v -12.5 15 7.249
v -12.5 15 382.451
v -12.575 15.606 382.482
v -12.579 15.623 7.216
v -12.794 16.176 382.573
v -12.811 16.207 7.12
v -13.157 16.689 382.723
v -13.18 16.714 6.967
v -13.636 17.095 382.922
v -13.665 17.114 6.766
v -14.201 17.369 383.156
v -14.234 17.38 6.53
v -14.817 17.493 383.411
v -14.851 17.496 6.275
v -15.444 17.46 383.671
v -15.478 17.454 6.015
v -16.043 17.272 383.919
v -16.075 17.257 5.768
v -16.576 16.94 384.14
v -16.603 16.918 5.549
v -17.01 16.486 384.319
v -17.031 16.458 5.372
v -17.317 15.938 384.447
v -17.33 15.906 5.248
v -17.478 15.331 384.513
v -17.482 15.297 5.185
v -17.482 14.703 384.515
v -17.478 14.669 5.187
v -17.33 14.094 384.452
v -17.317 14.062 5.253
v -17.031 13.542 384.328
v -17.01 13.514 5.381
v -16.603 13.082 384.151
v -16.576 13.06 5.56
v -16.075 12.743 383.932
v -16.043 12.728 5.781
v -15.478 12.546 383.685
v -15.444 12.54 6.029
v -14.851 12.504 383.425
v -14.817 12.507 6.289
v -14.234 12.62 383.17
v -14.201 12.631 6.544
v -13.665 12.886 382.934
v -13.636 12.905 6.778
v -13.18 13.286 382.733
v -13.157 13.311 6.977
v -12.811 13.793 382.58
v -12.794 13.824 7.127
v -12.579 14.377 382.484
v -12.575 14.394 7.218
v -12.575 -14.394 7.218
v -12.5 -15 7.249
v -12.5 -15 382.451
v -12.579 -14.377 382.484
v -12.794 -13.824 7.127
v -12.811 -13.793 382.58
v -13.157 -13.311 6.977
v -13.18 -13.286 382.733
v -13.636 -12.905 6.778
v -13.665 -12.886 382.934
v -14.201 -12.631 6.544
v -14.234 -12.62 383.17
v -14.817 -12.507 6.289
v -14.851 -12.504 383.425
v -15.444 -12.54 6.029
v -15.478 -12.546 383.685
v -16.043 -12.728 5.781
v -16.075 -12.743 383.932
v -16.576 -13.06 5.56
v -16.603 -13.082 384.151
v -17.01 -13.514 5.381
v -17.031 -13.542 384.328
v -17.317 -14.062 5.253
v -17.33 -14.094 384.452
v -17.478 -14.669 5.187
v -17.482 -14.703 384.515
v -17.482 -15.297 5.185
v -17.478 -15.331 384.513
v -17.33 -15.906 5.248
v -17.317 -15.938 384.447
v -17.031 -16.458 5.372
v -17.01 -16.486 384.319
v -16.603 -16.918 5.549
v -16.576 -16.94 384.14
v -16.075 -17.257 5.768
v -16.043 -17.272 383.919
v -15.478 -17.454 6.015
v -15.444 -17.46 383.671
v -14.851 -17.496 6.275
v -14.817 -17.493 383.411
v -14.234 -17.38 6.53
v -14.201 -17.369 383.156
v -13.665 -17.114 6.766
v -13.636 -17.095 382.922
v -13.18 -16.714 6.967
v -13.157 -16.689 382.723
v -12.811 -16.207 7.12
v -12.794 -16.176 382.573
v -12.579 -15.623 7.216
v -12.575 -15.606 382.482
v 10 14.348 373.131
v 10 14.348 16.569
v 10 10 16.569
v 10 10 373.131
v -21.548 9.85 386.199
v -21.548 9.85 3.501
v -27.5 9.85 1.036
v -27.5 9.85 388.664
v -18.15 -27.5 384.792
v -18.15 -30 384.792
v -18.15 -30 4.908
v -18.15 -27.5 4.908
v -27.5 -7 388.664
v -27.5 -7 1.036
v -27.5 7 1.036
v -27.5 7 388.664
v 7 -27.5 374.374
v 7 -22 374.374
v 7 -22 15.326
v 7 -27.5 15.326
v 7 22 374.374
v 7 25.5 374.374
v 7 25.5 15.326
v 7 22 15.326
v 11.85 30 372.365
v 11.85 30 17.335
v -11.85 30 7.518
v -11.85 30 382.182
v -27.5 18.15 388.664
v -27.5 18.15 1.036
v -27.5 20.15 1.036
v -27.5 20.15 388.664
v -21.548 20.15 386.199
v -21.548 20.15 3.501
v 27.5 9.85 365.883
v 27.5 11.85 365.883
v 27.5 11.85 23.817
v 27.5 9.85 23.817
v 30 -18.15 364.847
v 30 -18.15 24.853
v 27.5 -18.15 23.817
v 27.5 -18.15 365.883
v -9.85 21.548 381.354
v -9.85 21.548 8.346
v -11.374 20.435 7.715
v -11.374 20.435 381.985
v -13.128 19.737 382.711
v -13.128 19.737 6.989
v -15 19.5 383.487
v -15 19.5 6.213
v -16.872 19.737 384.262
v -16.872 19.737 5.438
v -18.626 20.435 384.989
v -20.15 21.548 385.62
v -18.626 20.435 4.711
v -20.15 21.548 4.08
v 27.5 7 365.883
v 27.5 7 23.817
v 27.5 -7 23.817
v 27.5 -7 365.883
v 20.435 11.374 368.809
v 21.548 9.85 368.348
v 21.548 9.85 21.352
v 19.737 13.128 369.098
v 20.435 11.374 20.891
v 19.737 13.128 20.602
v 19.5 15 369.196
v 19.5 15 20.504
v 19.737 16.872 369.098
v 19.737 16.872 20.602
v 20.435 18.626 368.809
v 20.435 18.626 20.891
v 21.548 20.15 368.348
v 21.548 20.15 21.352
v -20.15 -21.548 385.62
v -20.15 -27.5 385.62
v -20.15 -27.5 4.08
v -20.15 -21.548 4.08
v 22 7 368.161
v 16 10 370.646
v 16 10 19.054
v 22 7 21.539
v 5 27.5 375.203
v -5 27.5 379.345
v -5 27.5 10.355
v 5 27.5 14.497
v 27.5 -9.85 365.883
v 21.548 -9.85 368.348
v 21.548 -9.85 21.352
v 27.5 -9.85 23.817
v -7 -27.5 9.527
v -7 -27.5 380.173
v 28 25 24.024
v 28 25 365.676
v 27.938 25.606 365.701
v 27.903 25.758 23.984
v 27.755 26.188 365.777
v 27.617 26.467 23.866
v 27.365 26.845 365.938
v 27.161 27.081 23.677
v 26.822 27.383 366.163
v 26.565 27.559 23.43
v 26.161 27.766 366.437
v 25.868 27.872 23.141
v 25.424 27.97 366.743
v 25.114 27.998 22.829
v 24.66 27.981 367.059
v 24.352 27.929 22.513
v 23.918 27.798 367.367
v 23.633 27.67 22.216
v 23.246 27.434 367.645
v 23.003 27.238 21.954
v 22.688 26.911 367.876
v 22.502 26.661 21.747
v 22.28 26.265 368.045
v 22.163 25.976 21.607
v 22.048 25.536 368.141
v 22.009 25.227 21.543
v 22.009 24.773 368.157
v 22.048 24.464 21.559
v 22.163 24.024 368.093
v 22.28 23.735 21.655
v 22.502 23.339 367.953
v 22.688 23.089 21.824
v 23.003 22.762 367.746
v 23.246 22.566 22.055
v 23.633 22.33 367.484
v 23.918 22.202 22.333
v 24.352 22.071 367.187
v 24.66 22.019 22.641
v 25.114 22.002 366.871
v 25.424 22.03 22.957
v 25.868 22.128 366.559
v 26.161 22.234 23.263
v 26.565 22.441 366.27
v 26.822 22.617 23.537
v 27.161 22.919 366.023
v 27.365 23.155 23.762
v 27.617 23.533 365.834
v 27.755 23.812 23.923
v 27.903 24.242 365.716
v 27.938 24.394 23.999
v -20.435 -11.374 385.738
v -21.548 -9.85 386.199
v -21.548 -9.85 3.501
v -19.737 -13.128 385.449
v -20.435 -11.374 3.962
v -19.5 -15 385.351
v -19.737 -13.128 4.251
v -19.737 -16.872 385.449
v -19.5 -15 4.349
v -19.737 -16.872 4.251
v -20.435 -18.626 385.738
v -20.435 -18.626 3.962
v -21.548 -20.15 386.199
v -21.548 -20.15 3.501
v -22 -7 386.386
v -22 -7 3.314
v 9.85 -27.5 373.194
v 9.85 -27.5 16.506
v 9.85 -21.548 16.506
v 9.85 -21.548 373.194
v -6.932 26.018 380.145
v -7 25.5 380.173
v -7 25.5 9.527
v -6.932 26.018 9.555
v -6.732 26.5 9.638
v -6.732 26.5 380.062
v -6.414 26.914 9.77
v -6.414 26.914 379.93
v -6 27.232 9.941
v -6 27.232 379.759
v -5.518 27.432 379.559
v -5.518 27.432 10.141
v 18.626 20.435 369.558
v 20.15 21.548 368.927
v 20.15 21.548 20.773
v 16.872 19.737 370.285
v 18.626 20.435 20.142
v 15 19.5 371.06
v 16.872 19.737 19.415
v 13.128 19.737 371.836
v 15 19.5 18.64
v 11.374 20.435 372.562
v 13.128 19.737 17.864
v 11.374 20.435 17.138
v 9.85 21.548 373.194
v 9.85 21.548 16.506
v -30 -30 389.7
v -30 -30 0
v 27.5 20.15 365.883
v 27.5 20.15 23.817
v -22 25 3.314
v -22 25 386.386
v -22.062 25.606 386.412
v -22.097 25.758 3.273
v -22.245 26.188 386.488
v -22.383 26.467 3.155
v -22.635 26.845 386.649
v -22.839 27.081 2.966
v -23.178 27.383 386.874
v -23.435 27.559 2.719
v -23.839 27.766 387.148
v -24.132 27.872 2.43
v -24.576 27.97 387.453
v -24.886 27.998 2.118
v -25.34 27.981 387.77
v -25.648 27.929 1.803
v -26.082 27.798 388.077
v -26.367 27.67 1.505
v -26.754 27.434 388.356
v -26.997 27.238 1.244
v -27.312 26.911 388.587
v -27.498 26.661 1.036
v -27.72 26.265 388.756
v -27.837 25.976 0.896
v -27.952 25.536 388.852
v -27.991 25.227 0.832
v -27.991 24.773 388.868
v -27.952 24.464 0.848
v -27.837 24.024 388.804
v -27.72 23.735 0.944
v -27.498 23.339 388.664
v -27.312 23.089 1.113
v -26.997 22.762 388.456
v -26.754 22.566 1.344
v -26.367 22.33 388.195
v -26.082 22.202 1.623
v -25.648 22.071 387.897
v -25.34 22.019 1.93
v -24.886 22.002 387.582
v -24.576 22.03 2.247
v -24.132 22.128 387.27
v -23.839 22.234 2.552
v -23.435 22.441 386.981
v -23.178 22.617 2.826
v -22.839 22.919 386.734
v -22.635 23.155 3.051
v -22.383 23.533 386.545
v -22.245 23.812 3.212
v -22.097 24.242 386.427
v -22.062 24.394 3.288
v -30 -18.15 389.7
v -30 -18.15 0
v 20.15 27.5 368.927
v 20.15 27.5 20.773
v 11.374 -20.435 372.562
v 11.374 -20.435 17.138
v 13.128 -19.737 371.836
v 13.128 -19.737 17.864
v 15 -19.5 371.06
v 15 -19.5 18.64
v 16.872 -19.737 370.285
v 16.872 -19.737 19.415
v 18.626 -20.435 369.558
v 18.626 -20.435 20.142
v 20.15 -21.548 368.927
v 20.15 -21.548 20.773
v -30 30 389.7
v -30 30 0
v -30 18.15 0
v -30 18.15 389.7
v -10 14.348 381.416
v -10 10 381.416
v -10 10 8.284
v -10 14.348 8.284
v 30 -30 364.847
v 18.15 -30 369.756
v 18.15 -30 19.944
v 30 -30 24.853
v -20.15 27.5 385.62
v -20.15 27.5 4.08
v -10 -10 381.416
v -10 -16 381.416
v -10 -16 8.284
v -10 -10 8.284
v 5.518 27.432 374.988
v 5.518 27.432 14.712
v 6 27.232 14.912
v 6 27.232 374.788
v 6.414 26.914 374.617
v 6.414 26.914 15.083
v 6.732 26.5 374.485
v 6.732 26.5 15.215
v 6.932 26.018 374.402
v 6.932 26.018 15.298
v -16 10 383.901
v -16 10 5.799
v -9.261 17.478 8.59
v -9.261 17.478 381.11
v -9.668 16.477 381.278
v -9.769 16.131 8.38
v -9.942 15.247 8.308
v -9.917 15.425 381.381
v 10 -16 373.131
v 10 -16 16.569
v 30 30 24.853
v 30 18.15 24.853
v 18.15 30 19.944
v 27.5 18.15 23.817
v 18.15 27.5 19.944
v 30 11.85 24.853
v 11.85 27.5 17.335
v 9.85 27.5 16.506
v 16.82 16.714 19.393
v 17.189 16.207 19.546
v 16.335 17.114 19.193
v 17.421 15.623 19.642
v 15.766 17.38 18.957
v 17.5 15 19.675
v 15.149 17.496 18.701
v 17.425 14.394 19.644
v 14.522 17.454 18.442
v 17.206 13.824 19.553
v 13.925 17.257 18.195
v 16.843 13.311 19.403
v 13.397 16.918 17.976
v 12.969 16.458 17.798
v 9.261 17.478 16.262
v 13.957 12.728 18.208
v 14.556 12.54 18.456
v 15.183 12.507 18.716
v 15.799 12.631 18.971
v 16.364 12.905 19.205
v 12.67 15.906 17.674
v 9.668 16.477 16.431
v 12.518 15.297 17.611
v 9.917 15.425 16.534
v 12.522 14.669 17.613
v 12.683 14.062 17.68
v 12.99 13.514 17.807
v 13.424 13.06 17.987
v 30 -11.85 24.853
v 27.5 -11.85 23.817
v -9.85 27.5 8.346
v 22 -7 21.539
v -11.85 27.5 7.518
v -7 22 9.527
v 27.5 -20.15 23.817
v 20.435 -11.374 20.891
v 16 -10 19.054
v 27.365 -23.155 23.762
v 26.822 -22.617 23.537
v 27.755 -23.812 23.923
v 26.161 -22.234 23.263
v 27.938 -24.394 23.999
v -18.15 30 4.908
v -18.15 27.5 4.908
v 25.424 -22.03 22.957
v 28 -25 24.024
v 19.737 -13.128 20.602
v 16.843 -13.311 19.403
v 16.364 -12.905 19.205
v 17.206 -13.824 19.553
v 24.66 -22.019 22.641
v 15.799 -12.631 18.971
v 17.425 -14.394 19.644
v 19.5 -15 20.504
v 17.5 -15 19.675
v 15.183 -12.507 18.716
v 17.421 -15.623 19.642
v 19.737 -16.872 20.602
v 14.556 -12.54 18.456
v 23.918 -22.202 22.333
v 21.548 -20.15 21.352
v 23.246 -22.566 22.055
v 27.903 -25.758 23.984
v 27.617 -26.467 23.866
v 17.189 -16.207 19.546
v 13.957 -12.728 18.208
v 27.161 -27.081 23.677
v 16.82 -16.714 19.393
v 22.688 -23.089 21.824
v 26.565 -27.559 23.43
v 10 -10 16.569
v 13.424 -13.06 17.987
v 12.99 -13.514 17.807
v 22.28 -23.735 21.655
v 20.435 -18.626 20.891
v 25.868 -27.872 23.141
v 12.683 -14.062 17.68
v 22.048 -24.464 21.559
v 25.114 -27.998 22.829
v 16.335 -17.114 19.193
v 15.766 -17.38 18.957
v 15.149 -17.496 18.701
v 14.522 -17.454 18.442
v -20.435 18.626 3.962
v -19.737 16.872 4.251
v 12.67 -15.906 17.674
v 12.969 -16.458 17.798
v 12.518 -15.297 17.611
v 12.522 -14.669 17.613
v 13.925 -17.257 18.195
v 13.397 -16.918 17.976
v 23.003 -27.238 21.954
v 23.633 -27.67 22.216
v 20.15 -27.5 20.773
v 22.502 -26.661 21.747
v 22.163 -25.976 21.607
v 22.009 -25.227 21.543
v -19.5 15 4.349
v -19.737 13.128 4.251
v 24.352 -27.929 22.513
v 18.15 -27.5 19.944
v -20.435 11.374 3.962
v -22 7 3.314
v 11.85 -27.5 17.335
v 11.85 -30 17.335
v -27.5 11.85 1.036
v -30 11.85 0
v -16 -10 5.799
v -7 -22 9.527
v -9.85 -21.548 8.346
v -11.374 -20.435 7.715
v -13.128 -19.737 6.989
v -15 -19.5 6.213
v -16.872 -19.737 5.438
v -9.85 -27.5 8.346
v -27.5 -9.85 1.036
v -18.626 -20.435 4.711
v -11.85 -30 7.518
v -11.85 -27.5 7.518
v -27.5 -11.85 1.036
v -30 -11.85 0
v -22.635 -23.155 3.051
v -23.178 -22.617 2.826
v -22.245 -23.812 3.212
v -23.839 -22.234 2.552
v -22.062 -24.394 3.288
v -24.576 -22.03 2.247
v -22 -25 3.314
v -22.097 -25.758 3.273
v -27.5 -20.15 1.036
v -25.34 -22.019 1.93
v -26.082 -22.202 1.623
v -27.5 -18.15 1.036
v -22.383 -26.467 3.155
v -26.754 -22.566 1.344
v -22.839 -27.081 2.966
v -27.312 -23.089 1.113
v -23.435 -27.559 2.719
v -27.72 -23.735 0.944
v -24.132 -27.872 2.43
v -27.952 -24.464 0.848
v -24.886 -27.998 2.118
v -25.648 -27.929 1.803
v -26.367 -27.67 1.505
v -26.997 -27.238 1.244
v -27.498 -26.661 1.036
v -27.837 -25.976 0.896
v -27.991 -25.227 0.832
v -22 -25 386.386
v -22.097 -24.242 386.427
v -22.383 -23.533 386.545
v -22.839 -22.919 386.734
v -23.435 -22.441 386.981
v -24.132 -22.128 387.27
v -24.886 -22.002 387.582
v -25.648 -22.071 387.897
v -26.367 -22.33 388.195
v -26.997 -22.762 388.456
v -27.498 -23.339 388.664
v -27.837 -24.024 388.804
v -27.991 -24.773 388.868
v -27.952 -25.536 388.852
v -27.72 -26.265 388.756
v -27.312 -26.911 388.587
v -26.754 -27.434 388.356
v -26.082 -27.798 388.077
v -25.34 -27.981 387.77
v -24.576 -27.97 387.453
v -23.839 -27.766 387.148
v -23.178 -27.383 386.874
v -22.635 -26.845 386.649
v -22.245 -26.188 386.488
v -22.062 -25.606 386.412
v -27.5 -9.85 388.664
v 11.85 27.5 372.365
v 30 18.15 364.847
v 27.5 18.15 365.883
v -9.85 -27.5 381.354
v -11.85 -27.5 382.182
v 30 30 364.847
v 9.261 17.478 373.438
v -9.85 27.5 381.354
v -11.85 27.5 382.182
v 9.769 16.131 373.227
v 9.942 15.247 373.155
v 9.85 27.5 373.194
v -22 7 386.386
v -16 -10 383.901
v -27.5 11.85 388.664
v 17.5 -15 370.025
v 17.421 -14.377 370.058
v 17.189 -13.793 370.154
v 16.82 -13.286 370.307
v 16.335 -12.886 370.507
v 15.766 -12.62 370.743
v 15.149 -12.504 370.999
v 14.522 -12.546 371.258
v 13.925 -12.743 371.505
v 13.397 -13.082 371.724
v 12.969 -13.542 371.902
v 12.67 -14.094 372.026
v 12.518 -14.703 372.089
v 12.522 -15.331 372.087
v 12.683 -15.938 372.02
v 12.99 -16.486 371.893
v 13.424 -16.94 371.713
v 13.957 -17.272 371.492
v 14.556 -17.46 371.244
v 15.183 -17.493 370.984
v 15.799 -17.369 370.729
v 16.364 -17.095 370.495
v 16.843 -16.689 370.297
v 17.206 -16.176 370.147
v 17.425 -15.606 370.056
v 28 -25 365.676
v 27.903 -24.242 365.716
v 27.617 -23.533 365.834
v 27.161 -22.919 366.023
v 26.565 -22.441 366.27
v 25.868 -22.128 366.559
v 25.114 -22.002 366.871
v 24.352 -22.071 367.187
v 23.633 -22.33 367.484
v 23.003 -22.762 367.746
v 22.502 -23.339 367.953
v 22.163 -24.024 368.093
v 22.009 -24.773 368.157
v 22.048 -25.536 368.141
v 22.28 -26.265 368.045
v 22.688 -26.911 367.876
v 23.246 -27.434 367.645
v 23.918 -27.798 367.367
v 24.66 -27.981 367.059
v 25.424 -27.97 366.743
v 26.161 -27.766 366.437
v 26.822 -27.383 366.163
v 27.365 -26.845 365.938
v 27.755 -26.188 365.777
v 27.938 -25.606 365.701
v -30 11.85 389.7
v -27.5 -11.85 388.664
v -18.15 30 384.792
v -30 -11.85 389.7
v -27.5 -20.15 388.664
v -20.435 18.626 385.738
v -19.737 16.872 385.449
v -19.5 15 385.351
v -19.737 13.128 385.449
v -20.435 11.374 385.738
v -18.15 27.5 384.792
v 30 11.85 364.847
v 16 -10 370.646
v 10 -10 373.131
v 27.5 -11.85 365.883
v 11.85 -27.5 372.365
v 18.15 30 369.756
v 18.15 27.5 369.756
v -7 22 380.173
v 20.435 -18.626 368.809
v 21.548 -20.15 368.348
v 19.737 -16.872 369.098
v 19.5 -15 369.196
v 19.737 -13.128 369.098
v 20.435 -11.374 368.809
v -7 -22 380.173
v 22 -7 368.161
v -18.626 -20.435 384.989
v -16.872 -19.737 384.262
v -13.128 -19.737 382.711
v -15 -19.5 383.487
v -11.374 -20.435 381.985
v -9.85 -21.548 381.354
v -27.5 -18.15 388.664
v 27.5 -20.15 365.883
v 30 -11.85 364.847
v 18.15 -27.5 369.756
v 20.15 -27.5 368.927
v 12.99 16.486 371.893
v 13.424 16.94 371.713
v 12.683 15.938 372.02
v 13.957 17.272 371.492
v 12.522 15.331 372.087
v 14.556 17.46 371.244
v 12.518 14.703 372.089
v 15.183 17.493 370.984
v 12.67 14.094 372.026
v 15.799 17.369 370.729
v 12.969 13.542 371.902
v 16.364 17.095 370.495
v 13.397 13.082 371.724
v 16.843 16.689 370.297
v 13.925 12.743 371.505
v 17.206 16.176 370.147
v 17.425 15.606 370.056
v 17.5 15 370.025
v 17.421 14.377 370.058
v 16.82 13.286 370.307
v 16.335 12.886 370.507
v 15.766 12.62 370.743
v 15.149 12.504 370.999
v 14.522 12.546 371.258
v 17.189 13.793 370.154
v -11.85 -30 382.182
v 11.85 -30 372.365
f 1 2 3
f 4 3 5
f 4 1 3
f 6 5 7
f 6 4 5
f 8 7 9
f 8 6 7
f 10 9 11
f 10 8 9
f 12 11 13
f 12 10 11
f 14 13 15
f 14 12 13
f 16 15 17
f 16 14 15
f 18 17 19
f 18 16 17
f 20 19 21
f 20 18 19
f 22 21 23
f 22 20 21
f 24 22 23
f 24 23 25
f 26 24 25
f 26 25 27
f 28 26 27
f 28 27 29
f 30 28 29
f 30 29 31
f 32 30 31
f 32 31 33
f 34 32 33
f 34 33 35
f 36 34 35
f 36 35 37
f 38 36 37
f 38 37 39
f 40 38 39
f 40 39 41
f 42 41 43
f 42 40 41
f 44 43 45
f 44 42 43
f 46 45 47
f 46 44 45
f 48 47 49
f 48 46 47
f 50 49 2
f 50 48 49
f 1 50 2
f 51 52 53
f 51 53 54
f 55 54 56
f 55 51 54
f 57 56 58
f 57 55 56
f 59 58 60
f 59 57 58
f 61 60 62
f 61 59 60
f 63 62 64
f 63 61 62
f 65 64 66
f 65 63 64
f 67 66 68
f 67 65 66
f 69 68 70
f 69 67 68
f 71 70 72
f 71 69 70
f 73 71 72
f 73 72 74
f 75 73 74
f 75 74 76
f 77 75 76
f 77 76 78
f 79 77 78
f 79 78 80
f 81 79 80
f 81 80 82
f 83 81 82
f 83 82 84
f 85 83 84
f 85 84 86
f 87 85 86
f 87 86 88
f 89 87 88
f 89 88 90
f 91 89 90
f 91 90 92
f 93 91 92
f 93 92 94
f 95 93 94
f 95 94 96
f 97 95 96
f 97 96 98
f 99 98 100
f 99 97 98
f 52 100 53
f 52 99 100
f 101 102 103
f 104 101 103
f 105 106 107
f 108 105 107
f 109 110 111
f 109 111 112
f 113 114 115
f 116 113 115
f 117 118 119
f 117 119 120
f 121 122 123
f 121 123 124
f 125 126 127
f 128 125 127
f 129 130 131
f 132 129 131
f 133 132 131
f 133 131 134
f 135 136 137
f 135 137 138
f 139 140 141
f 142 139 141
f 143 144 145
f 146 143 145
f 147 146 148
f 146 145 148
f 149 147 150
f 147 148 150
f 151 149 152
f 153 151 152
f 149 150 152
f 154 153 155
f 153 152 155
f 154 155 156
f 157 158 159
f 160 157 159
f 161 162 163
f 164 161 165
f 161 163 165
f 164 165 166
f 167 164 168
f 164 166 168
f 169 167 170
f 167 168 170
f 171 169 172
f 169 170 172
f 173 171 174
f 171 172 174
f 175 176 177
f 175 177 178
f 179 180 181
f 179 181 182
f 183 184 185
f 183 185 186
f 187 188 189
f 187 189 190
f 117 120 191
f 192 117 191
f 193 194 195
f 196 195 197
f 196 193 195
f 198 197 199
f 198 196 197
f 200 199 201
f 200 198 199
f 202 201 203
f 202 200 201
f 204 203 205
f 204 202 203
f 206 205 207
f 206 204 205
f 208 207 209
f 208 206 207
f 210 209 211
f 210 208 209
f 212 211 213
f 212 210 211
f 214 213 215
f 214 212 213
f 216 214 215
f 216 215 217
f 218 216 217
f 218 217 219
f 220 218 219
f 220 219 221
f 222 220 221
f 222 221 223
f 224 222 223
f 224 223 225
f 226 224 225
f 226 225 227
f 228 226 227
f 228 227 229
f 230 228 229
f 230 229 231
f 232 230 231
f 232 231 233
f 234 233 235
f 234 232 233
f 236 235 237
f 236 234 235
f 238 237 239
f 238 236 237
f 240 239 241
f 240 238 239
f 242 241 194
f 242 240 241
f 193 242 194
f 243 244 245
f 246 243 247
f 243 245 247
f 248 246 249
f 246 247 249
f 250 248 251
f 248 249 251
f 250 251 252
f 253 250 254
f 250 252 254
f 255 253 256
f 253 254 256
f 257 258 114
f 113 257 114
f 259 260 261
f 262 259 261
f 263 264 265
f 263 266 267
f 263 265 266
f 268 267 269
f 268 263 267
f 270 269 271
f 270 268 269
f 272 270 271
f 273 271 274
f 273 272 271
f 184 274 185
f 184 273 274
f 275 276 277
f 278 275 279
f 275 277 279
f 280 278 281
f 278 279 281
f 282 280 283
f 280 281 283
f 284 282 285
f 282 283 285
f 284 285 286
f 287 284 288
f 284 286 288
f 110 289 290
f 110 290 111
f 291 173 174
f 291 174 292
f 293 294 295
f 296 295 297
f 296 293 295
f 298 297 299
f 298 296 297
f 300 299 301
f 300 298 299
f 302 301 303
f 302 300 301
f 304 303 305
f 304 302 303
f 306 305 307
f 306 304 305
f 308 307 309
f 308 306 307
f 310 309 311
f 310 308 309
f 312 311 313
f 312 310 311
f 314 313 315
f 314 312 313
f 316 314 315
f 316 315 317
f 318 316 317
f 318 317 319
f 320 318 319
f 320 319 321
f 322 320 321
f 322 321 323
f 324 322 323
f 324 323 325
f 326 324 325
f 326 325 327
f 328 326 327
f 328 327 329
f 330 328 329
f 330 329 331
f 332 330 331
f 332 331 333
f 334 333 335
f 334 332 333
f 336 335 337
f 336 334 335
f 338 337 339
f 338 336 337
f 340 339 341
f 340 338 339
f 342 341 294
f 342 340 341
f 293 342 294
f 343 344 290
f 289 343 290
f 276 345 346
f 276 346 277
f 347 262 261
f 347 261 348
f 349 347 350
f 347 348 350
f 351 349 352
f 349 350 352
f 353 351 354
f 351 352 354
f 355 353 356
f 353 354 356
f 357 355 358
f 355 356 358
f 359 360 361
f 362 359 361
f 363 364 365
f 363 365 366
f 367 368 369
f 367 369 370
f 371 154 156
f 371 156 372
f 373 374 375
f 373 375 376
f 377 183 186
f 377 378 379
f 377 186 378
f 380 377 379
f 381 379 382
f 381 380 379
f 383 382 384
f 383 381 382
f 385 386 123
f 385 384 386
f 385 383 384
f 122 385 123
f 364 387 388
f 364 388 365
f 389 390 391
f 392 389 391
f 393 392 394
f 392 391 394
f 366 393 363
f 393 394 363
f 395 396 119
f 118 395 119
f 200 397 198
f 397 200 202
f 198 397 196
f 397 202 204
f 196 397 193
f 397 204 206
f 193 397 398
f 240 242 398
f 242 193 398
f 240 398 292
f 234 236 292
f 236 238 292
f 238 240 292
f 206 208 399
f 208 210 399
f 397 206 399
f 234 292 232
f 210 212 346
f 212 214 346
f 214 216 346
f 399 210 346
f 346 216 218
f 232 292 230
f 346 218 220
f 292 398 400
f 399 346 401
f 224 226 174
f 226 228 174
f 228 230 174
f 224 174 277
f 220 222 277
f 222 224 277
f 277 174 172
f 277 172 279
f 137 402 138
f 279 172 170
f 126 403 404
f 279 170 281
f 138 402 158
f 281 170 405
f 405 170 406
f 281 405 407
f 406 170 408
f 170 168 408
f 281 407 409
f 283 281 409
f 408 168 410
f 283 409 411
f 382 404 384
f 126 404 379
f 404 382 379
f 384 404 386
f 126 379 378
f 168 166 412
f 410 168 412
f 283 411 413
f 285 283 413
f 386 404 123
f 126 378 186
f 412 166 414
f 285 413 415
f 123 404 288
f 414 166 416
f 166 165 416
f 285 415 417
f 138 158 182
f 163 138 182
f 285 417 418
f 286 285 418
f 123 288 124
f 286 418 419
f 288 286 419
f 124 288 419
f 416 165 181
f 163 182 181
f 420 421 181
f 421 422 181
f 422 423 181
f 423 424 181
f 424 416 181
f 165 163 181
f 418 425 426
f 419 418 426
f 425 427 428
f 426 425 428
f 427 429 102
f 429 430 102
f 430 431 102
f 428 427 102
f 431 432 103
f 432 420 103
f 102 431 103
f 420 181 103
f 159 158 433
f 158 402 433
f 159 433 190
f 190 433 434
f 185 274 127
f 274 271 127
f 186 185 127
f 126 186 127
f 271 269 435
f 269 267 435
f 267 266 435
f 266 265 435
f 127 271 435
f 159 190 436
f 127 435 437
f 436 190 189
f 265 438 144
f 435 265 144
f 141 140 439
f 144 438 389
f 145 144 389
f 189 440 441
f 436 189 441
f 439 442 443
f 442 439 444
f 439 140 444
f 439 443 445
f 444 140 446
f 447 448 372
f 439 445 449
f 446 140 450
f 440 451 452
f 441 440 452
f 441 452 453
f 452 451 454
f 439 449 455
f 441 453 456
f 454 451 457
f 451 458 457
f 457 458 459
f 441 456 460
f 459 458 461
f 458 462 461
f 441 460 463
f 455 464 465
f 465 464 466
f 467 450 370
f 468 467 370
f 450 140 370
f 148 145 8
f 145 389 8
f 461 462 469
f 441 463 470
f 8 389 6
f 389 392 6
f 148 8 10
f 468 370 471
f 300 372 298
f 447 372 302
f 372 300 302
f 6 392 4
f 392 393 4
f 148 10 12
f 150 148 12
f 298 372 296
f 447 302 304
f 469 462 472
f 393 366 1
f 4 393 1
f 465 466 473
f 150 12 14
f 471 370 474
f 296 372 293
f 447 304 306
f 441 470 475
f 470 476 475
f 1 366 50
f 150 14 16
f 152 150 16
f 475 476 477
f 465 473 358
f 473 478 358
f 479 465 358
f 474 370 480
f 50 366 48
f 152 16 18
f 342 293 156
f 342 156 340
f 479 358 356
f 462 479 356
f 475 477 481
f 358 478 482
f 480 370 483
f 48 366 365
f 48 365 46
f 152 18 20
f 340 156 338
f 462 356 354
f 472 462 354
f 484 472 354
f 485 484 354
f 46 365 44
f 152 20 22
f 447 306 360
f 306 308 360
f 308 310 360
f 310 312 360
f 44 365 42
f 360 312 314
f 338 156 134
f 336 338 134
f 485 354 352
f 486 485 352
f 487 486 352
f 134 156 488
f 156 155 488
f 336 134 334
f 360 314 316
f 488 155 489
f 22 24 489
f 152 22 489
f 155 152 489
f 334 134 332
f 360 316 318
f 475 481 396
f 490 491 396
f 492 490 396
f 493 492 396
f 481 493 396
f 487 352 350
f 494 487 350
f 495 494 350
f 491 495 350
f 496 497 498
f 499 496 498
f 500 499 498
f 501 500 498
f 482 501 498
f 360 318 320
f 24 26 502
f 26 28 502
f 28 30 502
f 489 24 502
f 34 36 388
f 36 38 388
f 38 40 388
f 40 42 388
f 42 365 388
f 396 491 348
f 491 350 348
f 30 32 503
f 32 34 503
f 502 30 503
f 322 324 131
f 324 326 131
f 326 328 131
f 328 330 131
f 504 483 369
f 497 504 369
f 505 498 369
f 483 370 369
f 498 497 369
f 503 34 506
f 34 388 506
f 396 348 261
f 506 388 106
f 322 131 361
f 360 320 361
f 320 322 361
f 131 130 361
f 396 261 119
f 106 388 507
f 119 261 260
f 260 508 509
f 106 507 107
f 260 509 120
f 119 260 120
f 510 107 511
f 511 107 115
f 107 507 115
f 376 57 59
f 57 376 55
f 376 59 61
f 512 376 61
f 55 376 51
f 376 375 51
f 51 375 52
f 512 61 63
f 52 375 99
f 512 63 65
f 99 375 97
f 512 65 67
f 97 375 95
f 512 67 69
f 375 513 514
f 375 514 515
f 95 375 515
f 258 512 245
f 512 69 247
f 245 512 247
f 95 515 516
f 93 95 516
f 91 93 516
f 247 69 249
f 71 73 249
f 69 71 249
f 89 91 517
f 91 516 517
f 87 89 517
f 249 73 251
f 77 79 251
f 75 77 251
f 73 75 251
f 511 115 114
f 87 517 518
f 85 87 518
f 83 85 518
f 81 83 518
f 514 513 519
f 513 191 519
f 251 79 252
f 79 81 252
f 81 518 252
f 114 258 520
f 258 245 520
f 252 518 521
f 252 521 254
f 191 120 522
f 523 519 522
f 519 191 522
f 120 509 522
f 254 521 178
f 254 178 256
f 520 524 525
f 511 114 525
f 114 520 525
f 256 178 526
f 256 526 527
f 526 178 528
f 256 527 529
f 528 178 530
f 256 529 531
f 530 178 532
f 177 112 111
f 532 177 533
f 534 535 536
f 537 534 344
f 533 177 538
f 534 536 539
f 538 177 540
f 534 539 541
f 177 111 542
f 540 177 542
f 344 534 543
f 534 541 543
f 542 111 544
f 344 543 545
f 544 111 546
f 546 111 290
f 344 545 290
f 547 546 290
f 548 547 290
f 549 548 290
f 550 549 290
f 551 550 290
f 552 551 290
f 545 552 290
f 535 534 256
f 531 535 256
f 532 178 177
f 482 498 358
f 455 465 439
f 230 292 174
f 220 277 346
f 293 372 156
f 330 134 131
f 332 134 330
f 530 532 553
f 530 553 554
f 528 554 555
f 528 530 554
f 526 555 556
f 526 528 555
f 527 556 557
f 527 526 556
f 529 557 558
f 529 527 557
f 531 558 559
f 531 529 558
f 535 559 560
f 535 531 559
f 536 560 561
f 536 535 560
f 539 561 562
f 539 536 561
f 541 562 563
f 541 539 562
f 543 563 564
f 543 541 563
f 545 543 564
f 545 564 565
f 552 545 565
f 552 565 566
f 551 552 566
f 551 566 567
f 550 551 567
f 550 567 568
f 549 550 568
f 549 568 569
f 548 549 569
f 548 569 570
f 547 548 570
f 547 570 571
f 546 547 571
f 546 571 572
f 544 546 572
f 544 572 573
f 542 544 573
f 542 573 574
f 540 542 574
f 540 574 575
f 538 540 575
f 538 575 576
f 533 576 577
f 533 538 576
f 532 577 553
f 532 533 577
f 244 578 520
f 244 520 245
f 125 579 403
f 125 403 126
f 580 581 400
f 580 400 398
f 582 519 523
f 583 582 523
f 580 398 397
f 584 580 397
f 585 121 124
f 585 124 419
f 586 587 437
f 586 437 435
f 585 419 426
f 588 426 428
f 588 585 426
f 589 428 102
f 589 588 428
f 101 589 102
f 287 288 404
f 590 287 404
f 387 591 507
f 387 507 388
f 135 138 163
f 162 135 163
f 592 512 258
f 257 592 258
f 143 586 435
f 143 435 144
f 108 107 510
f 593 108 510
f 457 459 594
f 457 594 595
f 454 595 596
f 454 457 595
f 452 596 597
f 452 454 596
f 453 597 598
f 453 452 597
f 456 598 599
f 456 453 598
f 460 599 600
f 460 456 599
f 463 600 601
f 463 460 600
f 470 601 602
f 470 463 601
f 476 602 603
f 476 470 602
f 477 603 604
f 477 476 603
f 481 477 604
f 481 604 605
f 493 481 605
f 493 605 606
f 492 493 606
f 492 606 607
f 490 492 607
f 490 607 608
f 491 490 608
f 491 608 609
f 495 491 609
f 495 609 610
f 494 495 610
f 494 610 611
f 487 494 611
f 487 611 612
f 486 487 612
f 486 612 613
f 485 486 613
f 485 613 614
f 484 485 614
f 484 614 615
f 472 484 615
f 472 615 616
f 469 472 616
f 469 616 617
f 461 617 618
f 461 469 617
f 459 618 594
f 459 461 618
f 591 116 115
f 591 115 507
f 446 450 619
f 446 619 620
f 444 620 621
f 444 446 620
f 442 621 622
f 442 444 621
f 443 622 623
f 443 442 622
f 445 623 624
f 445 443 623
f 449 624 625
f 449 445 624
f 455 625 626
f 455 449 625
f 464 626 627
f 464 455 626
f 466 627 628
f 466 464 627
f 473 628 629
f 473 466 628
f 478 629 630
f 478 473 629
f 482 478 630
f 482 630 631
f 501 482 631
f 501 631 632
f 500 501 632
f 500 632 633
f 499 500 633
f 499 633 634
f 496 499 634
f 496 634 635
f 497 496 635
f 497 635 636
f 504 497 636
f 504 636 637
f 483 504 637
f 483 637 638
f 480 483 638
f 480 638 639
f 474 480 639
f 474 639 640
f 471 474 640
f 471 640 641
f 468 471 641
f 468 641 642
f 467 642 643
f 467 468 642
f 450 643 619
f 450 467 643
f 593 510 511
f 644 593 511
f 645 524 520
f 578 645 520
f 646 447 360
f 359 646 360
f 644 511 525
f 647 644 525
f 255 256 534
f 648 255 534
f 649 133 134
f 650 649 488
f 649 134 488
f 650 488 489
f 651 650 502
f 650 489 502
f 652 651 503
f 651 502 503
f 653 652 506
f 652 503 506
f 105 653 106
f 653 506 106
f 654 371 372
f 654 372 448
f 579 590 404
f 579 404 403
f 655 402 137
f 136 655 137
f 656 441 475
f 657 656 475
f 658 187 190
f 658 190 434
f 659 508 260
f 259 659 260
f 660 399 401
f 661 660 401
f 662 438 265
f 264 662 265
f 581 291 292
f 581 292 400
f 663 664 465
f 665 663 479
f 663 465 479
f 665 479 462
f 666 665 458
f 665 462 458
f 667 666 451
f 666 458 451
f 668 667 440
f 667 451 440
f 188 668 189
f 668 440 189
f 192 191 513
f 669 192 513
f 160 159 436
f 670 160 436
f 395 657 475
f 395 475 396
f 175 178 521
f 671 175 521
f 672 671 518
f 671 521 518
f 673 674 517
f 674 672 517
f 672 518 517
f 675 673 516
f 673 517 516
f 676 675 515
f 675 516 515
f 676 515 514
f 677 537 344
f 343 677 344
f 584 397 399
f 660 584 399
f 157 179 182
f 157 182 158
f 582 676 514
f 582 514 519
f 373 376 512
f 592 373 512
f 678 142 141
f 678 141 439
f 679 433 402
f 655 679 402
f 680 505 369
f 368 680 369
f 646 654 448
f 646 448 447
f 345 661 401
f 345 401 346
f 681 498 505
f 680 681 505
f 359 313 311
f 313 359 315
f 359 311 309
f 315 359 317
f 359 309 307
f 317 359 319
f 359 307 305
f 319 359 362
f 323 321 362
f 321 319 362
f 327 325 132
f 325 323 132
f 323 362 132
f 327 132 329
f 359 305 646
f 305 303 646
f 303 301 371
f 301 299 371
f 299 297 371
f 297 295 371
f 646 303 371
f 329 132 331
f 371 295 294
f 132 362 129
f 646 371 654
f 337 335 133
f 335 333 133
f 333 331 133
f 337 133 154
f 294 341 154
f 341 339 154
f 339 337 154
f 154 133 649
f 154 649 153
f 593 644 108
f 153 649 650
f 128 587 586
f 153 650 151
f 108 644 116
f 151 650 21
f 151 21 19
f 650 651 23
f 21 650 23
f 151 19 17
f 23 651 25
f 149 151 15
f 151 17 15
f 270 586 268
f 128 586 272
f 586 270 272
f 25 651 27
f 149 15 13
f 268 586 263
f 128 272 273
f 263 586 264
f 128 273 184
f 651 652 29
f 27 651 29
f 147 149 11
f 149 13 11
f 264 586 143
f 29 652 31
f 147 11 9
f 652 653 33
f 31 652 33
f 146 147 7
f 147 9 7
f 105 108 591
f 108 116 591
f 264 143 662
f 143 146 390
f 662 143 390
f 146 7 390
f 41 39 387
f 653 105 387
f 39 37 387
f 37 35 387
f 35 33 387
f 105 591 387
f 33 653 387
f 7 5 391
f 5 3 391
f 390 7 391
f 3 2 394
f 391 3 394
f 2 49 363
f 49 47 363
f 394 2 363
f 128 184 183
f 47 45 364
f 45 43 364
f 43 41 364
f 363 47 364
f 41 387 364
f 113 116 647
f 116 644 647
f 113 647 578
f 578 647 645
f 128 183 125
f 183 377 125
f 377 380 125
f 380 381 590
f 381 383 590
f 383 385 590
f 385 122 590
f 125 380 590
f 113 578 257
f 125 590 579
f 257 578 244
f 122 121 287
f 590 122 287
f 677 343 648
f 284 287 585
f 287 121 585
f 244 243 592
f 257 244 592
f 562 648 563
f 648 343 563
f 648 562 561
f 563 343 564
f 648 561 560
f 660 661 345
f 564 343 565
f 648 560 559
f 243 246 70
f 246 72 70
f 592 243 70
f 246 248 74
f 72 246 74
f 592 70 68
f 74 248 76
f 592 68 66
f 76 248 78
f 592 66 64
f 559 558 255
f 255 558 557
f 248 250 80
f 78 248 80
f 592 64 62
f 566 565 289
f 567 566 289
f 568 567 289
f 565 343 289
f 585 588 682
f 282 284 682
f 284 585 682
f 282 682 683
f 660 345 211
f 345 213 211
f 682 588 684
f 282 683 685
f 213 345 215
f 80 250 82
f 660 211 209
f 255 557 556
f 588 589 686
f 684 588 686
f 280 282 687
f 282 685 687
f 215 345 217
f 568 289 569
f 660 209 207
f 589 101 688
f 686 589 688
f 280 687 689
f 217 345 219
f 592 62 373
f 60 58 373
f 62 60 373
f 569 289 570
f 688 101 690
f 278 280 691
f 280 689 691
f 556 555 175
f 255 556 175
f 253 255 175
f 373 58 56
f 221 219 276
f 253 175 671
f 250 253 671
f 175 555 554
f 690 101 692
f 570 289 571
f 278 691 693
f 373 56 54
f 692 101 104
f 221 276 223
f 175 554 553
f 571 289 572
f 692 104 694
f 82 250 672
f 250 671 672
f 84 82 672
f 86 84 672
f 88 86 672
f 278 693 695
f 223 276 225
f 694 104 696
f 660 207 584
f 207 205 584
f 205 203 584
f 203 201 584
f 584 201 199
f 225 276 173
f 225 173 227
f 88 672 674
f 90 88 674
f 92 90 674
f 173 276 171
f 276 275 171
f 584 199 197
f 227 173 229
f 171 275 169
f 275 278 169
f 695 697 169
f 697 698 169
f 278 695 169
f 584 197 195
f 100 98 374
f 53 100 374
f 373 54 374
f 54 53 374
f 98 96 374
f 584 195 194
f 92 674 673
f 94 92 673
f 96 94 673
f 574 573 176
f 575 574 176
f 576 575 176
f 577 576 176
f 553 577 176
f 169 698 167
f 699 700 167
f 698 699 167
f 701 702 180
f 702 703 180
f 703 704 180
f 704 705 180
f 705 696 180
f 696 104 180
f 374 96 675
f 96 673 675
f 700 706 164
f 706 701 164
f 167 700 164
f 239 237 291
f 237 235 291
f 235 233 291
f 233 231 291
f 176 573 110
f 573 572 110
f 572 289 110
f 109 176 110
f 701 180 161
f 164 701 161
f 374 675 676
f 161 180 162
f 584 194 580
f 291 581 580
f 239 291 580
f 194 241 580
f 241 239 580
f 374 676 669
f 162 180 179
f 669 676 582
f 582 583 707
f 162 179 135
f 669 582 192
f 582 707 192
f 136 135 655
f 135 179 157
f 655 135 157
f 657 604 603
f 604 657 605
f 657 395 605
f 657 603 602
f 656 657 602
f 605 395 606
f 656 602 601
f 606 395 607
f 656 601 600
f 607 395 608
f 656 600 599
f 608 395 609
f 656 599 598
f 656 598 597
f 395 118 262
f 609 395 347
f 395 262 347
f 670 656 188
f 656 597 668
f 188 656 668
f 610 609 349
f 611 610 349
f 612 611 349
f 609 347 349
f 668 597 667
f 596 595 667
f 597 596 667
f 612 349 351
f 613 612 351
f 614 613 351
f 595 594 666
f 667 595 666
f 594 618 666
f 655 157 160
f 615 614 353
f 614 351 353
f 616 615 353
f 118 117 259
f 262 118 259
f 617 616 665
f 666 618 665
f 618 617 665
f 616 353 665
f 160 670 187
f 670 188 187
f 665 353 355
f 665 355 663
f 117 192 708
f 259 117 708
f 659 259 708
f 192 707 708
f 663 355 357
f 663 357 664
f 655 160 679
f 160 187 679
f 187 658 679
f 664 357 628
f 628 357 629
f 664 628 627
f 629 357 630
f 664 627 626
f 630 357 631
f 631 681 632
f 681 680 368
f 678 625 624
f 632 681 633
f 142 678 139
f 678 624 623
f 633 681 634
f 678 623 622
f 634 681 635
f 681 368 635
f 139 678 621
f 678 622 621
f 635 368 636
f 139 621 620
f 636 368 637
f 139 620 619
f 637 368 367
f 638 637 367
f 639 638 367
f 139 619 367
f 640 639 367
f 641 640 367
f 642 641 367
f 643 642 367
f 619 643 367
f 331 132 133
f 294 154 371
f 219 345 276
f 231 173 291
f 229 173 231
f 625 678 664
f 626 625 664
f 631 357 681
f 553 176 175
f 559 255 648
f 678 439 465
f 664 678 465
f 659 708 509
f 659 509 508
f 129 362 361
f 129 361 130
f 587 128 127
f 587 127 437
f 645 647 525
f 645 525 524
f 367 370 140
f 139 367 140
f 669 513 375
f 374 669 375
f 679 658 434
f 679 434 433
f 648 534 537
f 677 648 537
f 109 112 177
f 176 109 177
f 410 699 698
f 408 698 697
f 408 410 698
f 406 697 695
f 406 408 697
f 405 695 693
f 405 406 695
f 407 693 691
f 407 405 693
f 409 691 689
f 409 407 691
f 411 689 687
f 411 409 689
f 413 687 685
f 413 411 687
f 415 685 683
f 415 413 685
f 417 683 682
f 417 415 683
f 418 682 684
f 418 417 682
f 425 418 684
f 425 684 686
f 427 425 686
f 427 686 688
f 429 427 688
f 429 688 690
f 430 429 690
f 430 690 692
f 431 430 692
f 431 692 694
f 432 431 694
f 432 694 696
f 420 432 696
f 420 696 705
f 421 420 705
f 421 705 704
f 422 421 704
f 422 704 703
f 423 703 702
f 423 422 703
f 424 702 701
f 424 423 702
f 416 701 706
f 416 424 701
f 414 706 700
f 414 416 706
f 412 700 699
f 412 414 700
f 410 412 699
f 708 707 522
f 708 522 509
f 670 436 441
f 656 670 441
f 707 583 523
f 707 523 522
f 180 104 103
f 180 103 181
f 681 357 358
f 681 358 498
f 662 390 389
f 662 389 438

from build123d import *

# Parameters (mm, degrees)
F0_R          = 3
F0_R_2        = 2.5
F1_DEPTH      = 389.7
F2_R          = 2
F3_R          = 7
F5_DEPTH      = 30
F5_DEPTH_BACK = 30


# Not quite as in the source:
# - a feature names something its author has since deleted; it is built from what else it names


with BuildPart() as f1:
    # F0 (on Top) → F1 (new body)
    with BuildSketch(Plane.XY):
        with BuildLine():
            Line((18.15, -30), (30, -30))
            Line((30, -30), (30, -18.15))
            Line((30, -18.15), (27.5, -18.15))
            Line((27.5, -18.15), (27.5, -20.15))
            Line((27.5, -20.15), (21.5477069044, -20.15))
            ThreePointArc((21.5477069044, -20.15), (19.5, -15), (21.5477069044, -9.85))
            Line((21.5477069044, -9.85), (27.5, -9.85))
            Line((27.5, -9.85), (27.5, -11.85))
            Line((27.5, -11.85), (30, -11.85))
            Line((30, -11.85), (30, 11.85))
            Line((30, 11.85), (27.5, 11.85))
            Line((27.5, 11.85), (27.5, 9.85))
            Line((27.5, 9.85), (21.5477069044, 9.85))
            ThreePointArc((21.5477069044, 9.85), (19.5, 15), (21.5477069044, 20.15))
            Line((21.5477069044, 20.15), (27.5, 20.15))
            Line((27.5, 20.15), (27.5, 18.15))
            Line((27.5, 18.15), (30, 18.15))
            Line((30, 18.15), (30, 30))
            Line((30, 30), (18.15, 30))
            Line((18.15, 30), (18.15, 27.5))
            Line((18.15, 27.5), (20.15, 27.5))
            Line((20.15, 27.5), (20.15, 21.5477069044))
            ThreePointArc((20.15, 21.5477069044), (15, 19.5), (9.85, 21.5477069044))
            Line((9.85, 21.5477069044), (9.85, 27.5))
            Line((9.85, 27.5), (11.85, 27.5))
            Line((11.85, 27.5), (11.85, 30))
            Line((11.85, 30), (-11.85, 30))
            Line((-11.85, 30), (-11.85, 27.5))
            Line((-11.85, 27.5), (-9.85, 27.5))
            Line((-9.85, 27.5), (-9.85, 21.5477069044))
            ThreePointArc((-9.85, 21.5477069044), (-15, 19.5), (-20.15, 21.5477069044))
            Line((-20.15, 21.5477069044), (-20.15, 27.5))
            Line((-20.15, 27.5), (-18.15, 27.5))
            Line((-18.15, 27.5), (-18.15, 30))
            Line((-18.15, 30), (-30, 30))
            Line((-30, 30), (-30, 18.15))
            Line((-30, 18.15), (-27.5, 18.15))
            Line((-27.5, 18.15), (-27.5, 20.15))
            Line((-27.5, 20.15), (-21.5477069044, 20.15))
            ThreePointArc((-21.5477069044, 20.15), (-19.5, 15), (-21.5477069044, 9.85))
            Line((-21.5477069044, 9.85), (-27.5, 9.85))
            Line((-27.5, 9.85), (-27.5, 11.85))
            Line((-27.5, 11.85), (-30, 11.85))
            Line((-30, 11.85), (-30, -11.85))
            Line((-30, -11.85), (-27.5, -11.85))
            Line((-27.5, -11.85), (-27.5, -9.85))
            Line((-27.5, -9.85), (-21.5477069044, -9.85))
            ThreePointArc((-21.5477069044, -9.85), (-19.5, -15), (-21.5477069044, -20.15))
            Line((-21.5477069044, -20.15), (-27.5, -20.15))
            Line((-27.5, -20.15), (-27.5, -18.15))
            Line((-27.5, -18.15), (-30, -18.15))
            Line((-30, -18.15), (-30, -30))
            Line((-30, -30), (-18.15, -30))
            Line((-18.15, -30), (-18.15, -27.5))
            Line((-18.15, -27.5), (-20.15, -27.5))
            Line((-20.15, -27.5), (-20.15, -21.5477069044))
            ThreePointArc((-20.15, -21.5477069044), (-15, -19.5), (-9.85, -21.5477069044))
            Line((-9.85, -21.5477069044), (-9.85, -27.5))
            Line((-9.85, -27.5), (-11.85, -27.5))
            Line((-11.85, -27.5), (-11.85, -30))
            Line((-11.85, -30), (11.85, -30))
            Line((11.85, -30), (11.85, -27.5))
            Line((11.85, -27.5), (9.85, -27.5))
            Line((9.85, -27.5), (9.85, -21.5477069044))
            ThreePointArc((9.85, -21.5477069044), (15, -19.5), (20.15, -21.5477069044))
            Line((20.15, -21.5477069044), (20.15, -27.5))
            Line((20.15, -27.5), (18.15, -27.5))
            Line((18.15, -27.5), (18.15, -30))
        make_face()
        with Locations((-25, -25)):
            Circle(F0_R, mode=Mode.SUBTRACT)
        with Locations((-15, -15)):
            Circle(F0_R_2, mode=Mode.SUBTRACT)
        with Locations((25, -25)):
            Circle(F0_R, mode=Mode.SUBTRACT)
        with Locations((15, -15)):
            Circle(F0_R_2, mode=Mode.SUBTRACT)
        with Locations((-25, 25)):
            Circle(F0_R, mode=Mode.SUBTRACT)
        with Locations((-15, 15)):
            Circle(F0_R_2, mode=Mode.SUBTRACT)
        Polygon((-7, 22), (-7, 27.5), (0, 27.5), (7, 27.5), (7, 22), (10, 16), (10, 10), (16, 10), (22, 7), (27.5, 7), (27.5, 0), (27.5, -7), (22, -7), (16, -10), (10, -10), (10, -16), (7, -22), (7, -27.5), (0, -27.5), (-7, -27.5), (-7, -22), (-10, -16), (-10, -10), (-16, -10), (-22, -7), (-27.5, -7), (-27.5, 0), (-27.5, 7), (-22, 7), (-16, 10), (-10, 10), (-10, 16), align=None, mode=Mode.SUBTRACT)
        with Locations((15, 15)):
            Circle(F0_R_2, mode=Mode.SUBTRACT)
        with Locations((25, 25)):
            Circle(F0_R, mode=Mode.SUBTRACT)
    extrude(amount=F1_DEPTH)

    # F2
    f2_edges = [f1.edges().sort_by_distance(p)[0] for p in [
        (-7, 27.5, 194.85),
        (7, 27.5, 194.85),
    ]]
    fillet(f2_edges, radius=F2_R)

    # F3
    f3_edges = [f1.edges().sort_by_distance(p)[0] for p in [
        (-10, 16, 194.85),
        (10, 16, 194.85),
    ]]
    fillet(f3_edges, radius=F3_R)

    # F4 (on Front) → F5 (cut, two sides)
    with BuildSketch(Plane.XZ) as f5_sk:
        Polygon((262.6101504464, 391.20035759), (13.3822209239, 494.4339461204), (-30, 389.7), (219.2279295224, 286.4664114696), align=None)
        Polygon((237.6533260841, 110.8656376783), (-30, 0), (20.6125739706, -122.1895625065), (288.2659000547, -11.3239248282), align=None)
    extrude(amount=F5_DEPTH, mode=Mode.SUBTRACT)
    extrude(f5_sk.sketch, amount=-F5_DEPTH_BACK, mode=Mode.SUBTRACT)


solid = f1.part
